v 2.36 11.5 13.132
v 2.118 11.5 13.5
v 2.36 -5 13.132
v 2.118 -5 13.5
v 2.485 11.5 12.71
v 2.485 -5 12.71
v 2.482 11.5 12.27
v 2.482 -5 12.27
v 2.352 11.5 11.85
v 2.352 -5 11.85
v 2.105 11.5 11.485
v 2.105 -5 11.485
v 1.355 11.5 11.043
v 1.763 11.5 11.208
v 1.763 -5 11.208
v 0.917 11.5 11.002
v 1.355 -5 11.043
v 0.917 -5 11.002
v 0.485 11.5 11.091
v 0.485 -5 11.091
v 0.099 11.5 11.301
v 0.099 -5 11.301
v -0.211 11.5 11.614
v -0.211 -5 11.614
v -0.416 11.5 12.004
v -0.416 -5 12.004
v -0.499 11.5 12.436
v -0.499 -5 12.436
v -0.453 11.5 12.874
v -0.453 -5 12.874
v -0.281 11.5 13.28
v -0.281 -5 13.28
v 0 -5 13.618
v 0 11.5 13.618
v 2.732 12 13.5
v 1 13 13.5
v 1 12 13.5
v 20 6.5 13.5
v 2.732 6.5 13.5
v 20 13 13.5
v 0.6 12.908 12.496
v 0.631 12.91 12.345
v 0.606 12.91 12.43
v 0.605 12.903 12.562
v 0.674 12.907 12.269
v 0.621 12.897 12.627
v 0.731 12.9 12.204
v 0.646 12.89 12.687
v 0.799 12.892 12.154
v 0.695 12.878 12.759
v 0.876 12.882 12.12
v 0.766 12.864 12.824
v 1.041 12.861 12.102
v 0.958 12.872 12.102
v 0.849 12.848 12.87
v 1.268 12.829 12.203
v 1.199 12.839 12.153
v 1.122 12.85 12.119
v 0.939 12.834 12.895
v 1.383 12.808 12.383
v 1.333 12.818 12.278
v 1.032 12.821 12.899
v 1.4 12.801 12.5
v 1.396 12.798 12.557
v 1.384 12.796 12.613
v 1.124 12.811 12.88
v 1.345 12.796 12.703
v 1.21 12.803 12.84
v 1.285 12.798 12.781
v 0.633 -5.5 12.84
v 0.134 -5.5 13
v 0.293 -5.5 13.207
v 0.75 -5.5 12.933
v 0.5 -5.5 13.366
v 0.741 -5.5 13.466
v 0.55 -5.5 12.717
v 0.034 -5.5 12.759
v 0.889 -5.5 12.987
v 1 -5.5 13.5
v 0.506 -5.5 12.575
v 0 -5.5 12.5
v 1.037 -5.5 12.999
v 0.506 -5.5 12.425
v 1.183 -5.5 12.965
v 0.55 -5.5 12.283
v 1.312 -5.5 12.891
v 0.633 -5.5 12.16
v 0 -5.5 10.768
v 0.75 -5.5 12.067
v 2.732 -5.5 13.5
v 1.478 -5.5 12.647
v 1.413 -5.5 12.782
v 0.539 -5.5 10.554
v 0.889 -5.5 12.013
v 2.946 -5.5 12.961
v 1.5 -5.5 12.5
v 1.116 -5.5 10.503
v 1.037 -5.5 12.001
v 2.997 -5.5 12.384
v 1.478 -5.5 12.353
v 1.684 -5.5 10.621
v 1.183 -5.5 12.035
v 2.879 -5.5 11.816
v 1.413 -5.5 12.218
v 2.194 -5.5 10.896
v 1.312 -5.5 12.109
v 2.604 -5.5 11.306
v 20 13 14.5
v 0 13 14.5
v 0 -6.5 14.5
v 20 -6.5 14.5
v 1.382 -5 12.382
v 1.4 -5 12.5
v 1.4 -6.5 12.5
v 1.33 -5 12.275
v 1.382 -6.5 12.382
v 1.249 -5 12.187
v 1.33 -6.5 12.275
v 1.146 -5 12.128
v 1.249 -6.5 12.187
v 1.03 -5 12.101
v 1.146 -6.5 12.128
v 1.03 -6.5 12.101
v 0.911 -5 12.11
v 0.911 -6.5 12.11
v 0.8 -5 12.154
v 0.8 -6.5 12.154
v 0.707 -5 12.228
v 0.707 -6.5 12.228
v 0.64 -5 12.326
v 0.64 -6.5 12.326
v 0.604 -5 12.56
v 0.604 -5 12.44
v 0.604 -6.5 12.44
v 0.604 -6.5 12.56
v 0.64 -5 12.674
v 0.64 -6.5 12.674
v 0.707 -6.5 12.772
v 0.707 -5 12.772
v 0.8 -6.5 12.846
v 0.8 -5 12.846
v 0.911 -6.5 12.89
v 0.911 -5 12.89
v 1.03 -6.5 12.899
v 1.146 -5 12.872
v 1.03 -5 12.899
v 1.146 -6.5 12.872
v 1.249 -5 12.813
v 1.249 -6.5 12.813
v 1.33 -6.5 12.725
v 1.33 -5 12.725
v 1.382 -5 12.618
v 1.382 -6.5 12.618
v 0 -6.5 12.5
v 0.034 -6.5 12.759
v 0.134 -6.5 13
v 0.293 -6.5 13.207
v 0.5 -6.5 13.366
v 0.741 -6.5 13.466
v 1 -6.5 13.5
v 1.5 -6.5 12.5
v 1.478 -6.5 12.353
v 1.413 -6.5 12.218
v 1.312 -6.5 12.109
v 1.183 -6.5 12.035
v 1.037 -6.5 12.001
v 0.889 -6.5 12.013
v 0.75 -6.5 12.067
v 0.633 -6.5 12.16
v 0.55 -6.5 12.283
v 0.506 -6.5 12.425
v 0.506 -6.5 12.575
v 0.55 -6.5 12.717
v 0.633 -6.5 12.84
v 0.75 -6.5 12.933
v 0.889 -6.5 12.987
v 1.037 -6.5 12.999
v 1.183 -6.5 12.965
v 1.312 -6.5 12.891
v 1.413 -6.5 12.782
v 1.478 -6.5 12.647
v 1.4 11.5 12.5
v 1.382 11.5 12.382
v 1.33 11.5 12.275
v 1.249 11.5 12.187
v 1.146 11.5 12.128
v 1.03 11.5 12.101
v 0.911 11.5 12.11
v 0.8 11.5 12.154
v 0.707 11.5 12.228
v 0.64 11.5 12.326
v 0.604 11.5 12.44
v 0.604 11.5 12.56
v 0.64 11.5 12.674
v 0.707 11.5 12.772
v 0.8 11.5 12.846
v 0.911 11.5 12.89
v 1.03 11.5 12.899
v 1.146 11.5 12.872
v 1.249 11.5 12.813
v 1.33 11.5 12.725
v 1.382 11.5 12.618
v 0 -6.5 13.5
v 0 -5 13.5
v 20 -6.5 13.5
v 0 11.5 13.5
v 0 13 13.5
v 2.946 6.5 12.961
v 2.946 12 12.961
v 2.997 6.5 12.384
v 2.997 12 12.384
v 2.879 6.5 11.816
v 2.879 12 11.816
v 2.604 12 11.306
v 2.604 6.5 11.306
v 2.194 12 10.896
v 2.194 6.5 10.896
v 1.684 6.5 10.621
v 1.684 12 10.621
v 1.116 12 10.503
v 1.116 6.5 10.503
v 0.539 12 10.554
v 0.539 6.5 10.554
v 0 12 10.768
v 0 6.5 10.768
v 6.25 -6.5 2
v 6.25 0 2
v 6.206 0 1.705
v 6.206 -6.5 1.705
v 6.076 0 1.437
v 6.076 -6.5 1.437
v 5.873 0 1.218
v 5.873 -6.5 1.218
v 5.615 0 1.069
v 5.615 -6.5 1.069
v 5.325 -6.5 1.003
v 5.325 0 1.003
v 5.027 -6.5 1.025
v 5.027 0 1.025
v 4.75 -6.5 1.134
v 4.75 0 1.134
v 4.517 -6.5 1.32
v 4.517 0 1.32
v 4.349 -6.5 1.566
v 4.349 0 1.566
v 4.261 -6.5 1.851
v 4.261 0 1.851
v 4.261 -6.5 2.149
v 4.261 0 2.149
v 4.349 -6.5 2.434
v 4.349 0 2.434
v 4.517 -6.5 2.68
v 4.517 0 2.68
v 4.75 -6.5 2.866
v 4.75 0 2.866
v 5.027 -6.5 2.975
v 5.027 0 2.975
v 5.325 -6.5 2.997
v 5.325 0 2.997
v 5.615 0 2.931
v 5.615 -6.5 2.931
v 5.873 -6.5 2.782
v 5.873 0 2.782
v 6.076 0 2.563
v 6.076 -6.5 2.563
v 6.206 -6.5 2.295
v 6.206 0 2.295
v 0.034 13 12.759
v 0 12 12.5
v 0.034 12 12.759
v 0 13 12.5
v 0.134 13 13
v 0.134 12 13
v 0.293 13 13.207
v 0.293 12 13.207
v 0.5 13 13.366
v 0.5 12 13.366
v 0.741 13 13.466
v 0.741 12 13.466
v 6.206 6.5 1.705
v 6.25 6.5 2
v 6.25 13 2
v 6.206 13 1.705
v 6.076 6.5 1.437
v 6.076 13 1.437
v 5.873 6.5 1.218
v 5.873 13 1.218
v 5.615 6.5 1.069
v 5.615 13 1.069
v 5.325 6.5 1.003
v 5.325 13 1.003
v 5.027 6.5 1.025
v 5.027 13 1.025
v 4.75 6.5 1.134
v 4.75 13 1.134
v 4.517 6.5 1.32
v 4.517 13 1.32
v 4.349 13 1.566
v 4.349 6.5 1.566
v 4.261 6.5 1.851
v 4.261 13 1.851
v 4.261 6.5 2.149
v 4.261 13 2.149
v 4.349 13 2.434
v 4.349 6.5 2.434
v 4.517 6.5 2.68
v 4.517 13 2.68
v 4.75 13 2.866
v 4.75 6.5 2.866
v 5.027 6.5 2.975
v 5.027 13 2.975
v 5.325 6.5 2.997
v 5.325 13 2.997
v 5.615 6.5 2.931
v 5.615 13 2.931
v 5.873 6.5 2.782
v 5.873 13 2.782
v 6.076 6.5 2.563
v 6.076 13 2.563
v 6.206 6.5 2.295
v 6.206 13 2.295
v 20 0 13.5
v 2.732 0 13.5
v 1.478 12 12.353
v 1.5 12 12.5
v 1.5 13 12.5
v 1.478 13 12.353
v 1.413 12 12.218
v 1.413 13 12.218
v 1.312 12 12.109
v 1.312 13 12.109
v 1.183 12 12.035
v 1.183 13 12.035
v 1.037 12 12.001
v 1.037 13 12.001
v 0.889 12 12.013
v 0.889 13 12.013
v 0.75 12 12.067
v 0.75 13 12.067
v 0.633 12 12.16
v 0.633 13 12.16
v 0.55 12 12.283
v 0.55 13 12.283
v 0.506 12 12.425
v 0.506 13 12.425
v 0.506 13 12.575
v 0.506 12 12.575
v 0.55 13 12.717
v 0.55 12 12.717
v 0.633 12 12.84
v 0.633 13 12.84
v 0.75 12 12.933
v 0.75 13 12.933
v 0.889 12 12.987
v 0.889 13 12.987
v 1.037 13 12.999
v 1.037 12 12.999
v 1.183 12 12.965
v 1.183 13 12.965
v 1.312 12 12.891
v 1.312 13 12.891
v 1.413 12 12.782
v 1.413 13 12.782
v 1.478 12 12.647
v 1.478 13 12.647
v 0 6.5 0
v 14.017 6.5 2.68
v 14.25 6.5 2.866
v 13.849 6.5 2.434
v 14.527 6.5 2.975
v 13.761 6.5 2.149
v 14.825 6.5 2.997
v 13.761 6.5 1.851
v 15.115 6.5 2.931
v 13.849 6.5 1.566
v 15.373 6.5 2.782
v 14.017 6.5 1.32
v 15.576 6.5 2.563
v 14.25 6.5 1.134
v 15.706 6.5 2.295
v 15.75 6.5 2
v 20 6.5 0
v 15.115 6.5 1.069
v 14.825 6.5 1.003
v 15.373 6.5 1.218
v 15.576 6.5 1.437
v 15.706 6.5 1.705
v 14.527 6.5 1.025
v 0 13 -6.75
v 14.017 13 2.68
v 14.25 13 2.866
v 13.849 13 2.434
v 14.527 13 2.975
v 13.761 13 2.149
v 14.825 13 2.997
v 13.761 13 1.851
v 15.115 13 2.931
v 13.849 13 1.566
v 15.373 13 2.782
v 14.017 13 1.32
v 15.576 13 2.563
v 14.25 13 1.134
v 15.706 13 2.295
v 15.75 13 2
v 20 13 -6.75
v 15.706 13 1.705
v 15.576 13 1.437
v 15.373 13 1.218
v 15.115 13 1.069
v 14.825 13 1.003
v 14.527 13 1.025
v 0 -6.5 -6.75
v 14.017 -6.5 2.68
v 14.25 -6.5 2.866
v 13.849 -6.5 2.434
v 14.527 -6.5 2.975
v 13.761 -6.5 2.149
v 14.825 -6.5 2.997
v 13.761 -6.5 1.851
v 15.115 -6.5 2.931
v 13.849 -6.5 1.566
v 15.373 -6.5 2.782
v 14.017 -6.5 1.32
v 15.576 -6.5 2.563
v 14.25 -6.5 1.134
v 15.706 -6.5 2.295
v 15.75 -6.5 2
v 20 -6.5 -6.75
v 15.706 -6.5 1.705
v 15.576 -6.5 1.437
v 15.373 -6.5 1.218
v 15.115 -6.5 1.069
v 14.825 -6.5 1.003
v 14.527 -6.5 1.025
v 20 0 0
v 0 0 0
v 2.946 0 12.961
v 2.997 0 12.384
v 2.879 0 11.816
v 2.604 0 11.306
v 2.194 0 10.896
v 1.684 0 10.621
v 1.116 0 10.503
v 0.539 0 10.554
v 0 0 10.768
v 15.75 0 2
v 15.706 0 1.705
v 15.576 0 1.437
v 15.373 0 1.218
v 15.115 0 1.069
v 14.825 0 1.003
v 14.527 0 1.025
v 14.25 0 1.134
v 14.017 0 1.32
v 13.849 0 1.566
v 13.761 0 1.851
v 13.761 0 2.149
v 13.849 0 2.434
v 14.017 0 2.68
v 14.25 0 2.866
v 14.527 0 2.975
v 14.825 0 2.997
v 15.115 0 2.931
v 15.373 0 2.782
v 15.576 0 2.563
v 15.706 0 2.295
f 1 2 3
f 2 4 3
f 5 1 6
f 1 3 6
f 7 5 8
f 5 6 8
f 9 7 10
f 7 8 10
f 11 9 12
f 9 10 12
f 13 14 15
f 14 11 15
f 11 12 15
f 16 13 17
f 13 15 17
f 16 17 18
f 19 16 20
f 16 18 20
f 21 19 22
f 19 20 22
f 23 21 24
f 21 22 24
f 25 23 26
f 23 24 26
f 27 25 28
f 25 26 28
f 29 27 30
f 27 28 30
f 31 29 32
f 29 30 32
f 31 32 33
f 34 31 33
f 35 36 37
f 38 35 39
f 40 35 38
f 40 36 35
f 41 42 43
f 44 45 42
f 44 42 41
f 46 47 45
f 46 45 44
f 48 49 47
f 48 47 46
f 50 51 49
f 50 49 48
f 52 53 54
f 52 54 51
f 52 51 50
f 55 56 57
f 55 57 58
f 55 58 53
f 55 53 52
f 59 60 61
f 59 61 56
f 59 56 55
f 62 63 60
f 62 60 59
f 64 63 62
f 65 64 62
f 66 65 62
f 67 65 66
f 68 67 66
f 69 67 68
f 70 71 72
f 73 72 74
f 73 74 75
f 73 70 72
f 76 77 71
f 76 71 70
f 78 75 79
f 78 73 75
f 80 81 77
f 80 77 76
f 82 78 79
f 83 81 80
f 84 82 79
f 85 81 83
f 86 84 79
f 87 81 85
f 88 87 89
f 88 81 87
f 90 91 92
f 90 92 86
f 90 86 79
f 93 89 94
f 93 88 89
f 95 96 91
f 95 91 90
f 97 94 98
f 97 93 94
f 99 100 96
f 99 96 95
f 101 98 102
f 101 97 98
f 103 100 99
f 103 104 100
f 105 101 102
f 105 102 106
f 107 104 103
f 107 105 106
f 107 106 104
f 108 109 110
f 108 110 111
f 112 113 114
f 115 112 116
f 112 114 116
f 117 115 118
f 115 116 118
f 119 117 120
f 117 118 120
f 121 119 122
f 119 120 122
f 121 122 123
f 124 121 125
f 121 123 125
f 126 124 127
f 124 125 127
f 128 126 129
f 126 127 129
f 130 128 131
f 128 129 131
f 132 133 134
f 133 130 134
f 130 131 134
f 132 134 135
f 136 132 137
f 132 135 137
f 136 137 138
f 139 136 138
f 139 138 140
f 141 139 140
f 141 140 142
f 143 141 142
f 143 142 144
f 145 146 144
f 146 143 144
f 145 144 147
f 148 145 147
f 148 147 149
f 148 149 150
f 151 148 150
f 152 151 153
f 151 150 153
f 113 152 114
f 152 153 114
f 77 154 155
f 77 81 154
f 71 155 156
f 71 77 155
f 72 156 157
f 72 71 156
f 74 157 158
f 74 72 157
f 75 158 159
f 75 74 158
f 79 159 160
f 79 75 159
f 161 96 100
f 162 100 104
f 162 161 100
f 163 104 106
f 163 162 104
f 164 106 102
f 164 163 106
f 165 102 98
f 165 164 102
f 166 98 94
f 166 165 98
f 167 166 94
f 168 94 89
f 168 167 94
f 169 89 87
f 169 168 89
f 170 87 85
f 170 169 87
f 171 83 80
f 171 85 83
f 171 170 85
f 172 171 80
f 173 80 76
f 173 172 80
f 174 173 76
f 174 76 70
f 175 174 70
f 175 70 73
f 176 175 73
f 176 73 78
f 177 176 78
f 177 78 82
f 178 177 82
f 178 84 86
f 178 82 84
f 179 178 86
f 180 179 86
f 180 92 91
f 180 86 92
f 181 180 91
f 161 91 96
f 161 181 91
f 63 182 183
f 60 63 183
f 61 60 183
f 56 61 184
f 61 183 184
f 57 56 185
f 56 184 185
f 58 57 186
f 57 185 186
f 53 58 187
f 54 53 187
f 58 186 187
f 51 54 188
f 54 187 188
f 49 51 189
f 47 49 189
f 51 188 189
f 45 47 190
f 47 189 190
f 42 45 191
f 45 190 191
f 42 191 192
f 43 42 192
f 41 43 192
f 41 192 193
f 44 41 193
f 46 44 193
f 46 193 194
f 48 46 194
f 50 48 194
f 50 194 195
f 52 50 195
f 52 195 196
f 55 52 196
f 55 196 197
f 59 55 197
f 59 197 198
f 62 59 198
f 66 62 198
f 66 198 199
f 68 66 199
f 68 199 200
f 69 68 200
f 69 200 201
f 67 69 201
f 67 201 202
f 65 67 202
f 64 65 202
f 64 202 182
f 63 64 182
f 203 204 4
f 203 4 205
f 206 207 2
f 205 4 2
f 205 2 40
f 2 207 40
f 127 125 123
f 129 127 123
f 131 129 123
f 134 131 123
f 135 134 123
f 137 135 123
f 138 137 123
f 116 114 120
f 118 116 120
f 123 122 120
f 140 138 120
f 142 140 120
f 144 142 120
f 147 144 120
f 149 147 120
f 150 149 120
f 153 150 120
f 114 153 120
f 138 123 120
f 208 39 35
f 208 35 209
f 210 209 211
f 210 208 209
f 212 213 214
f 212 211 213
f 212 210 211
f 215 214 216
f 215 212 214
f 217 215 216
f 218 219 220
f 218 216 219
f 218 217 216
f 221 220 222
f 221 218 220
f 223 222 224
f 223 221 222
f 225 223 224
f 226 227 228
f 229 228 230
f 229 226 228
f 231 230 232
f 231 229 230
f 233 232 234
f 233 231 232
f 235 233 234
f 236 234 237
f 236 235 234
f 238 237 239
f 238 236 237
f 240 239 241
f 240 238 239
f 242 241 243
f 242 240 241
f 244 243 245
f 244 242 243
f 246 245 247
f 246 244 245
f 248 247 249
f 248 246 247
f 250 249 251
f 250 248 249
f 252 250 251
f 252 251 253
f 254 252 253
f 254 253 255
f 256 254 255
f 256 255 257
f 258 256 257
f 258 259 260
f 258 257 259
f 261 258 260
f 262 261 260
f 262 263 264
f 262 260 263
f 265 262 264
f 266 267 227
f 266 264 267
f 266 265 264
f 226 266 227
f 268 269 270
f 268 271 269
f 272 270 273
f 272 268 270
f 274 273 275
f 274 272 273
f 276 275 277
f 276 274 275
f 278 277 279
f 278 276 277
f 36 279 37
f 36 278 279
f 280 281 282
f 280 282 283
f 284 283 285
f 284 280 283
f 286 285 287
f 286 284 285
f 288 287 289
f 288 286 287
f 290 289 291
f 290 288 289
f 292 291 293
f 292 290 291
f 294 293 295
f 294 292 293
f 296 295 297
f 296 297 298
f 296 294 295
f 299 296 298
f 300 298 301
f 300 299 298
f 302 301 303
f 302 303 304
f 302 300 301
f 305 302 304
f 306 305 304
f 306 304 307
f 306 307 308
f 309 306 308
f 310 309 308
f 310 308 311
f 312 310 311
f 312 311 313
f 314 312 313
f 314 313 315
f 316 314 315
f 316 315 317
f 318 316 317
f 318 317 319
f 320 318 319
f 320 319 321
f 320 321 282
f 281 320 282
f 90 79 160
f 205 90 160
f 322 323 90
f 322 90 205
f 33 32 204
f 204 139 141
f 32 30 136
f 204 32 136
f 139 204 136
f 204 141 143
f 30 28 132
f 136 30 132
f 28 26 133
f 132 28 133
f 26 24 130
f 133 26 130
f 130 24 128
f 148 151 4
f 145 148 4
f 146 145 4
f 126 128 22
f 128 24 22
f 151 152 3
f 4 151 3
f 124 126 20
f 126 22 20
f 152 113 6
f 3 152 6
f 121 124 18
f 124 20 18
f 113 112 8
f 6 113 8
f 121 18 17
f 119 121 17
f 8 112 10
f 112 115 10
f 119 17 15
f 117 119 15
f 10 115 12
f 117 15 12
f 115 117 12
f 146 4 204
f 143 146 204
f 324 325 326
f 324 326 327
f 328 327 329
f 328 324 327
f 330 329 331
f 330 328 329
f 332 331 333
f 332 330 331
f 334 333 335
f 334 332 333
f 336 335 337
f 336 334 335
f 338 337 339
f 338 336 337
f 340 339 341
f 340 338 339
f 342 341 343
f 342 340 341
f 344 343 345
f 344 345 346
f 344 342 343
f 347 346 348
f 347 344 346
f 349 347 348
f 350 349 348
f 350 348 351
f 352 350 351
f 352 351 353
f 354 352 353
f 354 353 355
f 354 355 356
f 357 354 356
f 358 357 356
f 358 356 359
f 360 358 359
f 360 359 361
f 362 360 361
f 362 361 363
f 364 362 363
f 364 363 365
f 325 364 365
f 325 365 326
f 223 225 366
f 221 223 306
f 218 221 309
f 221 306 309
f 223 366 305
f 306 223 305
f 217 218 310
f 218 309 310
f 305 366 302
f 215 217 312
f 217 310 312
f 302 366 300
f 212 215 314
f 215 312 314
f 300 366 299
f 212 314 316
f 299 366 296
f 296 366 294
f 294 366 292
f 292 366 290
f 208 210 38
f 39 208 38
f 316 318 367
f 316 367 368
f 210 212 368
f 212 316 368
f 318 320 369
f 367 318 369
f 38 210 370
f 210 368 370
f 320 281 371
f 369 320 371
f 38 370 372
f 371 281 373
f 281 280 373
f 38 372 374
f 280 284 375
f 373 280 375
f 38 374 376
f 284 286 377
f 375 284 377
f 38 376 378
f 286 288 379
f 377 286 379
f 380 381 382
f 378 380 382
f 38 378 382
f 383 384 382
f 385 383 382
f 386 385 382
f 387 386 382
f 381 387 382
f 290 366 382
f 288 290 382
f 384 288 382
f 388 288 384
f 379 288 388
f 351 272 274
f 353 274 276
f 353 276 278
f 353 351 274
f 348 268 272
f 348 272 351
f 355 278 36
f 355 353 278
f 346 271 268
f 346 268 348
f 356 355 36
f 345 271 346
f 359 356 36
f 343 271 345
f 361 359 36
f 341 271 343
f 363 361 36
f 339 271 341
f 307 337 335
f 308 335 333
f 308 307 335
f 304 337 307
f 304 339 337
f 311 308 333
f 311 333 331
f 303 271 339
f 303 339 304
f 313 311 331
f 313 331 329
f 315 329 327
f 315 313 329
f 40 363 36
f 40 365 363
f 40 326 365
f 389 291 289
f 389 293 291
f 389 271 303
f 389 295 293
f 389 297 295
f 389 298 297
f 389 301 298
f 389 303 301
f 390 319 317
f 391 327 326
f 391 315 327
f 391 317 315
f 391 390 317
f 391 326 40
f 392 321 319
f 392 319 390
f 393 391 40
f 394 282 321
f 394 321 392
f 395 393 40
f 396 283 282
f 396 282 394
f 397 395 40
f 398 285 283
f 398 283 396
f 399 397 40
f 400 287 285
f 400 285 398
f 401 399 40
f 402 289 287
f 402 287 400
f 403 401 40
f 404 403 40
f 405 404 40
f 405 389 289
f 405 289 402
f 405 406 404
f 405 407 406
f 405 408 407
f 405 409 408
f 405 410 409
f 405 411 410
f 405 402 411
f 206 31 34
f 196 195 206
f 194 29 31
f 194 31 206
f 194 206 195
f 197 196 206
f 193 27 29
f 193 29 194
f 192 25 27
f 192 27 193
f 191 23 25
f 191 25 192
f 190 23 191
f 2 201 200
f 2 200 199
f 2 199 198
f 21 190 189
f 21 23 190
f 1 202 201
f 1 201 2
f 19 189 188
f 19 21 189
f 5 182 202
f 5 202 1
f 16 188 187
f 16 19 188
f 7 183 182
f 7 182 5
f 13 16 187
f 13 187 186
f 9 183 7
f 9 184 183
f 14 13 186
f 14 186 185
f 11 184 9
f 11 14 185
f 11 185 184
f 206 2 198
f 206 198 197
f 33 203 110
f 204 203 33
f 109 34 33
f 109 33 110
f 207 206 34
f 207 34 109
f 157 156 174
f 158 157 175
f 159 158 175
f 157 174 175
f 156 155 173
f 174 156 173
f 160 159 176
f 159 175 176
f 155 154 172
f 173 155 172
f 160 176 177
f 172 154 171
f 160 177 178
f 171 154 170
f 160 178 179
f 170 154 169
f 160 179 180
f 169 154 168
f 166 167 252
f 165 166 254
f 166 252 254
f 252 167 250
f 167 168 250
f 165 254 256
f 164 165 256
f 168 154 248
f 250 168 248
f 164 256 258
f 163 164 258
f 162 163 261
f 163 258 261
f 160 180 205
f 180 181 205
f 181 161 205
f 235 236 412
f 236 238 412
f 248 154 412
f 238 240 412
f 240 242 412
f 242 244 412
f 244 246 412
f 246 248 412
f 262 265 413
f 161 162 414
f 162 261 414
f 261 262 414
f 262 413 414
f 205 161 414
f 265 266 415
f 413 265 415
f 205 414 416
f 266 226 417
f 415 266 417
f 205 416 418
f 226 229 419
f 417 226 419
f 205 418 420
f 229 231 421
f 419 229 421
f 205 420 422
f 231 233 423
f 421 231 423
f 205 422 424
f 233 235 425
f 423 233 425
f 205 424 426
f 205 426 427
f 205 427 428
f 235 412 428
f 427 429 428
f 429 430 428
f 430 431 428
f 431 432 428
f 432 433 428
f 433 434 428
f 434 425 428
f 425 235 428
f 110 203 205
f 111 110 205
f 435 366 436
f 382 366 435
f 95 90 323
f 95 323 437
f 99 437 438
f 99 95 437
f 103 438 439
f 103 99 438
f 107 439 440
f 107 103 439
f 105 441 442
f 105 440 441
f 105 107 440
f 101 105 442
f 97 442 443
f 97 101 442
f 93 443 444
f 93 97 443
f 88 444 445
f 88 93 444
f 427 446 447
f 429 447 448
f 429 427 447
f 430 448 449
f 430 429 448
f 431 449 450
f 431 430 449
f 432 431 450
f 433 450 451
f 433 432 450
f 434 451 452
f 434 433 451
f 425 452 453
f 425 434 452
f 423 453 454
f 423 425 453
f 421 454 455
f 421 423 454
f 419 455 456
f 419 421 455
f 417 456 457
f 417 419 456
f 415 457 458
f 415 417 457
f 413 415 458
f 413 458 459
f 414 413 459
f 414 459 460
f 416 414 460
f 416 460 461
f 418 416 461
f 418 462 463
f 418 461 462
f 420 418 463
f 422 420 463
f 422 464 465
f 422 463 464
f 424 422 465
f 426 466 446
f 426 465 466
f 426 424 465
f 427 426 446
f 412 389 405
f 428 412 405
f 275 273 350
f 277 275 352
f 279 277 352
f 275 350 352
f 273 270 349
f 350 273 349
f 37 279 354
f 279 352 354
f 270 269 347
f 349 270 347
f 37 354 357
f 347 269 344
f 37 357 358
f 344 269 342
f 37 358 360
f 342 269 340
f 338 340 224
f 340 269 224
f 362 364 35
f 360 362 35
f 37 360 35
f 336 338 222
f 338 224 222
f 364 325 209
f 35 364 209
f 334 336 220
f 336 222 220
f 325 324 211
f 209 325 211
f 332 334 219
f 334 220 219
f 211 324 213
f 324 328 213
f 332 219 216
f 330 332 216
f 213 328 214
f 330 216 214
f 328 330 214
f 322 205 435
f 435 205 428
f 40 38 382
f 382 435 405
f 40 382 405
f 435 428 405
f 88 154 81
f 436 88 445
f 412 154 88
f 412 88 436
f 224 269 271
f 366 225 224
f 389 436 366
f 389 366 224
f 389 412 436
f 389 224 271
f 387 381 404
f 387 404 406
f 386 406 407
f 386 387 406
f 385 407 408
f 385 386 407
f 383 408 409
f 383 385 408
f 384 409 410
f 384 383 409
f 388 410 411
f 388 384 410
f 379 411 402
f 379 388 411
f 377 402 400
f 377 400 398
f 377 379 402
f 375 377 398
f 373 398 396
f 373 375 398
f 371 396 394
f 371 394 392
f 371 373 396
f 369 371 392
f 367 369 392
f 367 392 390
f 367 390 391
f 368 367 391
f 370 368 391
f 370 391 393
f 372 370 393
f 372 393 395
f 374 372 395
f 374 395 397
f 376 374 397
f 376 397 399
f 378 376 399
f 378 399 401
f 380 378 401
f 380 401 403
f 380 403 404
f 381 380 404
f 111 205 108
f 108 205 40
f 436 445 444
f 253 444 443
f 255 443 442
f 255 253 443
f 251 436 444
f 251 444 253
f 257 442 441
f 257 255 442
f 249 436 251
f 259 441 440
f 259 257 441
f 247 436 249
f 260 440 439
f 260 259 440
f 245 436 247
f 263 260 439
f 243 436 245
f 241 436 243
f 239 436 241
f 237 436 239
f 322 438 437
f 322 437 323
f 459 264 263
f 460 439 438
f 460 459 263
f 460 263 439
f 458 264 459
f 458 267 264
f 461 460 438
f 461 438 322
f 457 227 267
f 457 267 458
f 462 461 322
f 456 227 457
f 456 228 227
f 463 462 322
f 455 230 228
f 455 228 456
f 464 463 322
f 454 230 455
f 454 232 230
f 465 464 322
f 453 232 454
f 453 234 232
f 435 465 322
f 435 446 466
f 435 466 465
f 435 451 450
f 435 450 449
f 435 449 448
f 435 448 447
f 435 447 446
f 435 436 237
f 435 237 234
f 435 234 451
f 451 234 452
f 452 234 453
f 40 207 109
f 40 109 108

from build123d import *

# Parameters (mm, degrees)
CONE_PITCH_ANGLE       = 90
CYLINDER003_R          = 0.4
CYLINDER003_DEPTH      = 19.5
CYLINDER003_ROLL_ANGLE = -90
CYLINDER002_R          = 1.5
CYLINDER002_DEPTH      = 16.5
CYLINDER002_ROLL_ANGLE = -90
BOX002_W               = 20
BOX002_H               = 19.5
BOX002_DEPTH           = 1
CYLINDER001_R          = 0.5
CYLINDER001_DEPTH      = 19.5
CYLINDER001_ROLL_ANGLE = -90
CYLINDER005_R          = 1
CYLINDER005_DEPTH      = 19.5
CYLINDER005_ROLL_ANGLE = -90
CYLINDER004_R          = 1
CYLINDER004_DEPTH      = 19.5
CYLINDER004_ROLL_ANGLE = -90
BOX001_W               = 20
BOX001_H               = 6.5
BOX001_DEPTH           = 13.5
CYLINDER_R             = 2
CYLINDER_DEPTH         = 17.5
CYLINDER_ROLL_ANGLE    = -90
BOX_W                  = 20
BOX_H                  = 19.5
BOX_DEPTH              = 20.25
FILLET_R               = 1


with BuildPart() as cone:
    # Cone → Cone (revolve)
    with BuildSketch(Plane.XZ):
        Polygon((0, 0), (10, 0), (6, 30), (0, 30), align=None)
    revolve(axis=Axis((0, 0, 0), (0, 0, 1)))


with BuildPart() as cone_1:
    # Cone pitch: moved
    add(cone.part.rotate(Axis((0, 0, 0), (0, 1, 0)), CONE_PITCH_ANGLE))


with BuildPart() as cone_2:
    # Cone placement: moved
    add(cone_1.part.moved(Location((0, 3, 12))))


with BuildPart() as lid_hinge_pin_tapered:
    # Cylinder003 → Cylinder003 (new body)
    with BuildSketch(Plane.XY):
        Circle(CYLINDER003_R)
    extrude(amount=CYLINDER003_DEPTH)


with BuildPart() as lid_hinge_pin_tapered_1:
    # Cylinder003 roll: moved
    add(lid_hinge_pin_tapered.part.rotate(Axis((0, 0, 0), (1, 0, 0)), CYLINDER003_ROLL_ANGLE))


with BuildPart() as lid_hinge_pin_tapered_2:
    # Cylinder003 placement: moved
    add(lid_hinge_pin_tapered_1.part.moved(Location((1, -6.5, 12.5))))

    # Common: intersect Cone
    add(cone_2.part, mode=Mode.INTERSECT)


with BuildPart() as lid_hinge:
    # Cylinder002 → Cylinder002 (new body)
    with BuildSketch(Plane.XY):
        Circle(CYLINDER002_R)
    extrude(amount=CYLINDER002_DEPTH)


with BuildPart() as lid_hinge_1:
    # Cylinder002 roll: moved
    add(lid_hinge.part.rotate(Axis((0, 0, 0), (1, 0, 0)), CYLINDER002_ROLL_ANGLE))


with BuildPart() as lid_hinge_2:
    # Cylinder002 placement: moved
    add(lid_hinge_1.part.moved(Location((1, -5, 12.5))))

    # Fusion003: union lid_hinge_pin_tapered
    add(lid_hinge_pin_tapered_2.part)


with BuildPart() as lid:
    # Box002 → Box002 (new body)
    with BuildSketch(Plane(origin=(0, -6.5, 13.5), x_dir=(1, 0, 0), z_dir=(0, 0, 1))):
        with Locations((10, 9.75)):
            Rectangle(BOX002_W, BOX002_H)
    extrude(amount=BOX002_DEPTH)

    # Fusion: union lid_hinge
    add(lid_hinge_2.part)


with BuildPart() as hinge_pin_hole:
    # Cylinder001 → Cylinder001 (new body)
    with BuildSketch(Plane.XY):
        Circle(CYLINDER001_R)
    extrude(amount=CYLINDER001_DEPTH)


with BuildPart() as hinge_pin_hole_1:
    # Cylinder001 roll: moved
    add(hinge_pin_hole.part.rotate(Axis((0, 0, 0), (1, 0, 0)), CYLINDER001_ROLL_ANGLE))


with BuildPart() as hinge_pin_hole_2:
    # Cylinder001 placement: moved
    add(hinge_pin_hole_1.part.moved(Location((1, -6.5, 12.5))))


with BuildPart() as cylinder005:
    # Cylinder005 → Cylinder005 (new body)
    with BuildSketch(Plane.XY):
        Circle(CYLINDER005_R)
    extrude(amount=CYLINDER005_DEPTH)


with BuildPart() as cylinder005_1:
    # Cylinder005 roll: moved
    add(cylinder005.part.rotate(Axis((0, 0, 0), (1, 0, 0)), CYLINDER005_ROLL_ANGLE))


with BuildPart() as cylinder005_2:
    # Cylinder005 placement: moved
    add(cylinder005_1.part.moved(Location((14.75, -6.5, 2))))


with BuildPart() as cylinder004:
    # Cylinder004 → Cylinder004 (new body)
    with BuildSketch(Plane.XY):
        Circle(CYLINDER004_R)
    extrude(amount=CYLINDER004_DEPTH)


with BuildPart() as cylinder004_1:
    # Cylinder004 roll: moved
    add(cylinder004.part.rotate(Axis((0, 0, 0), (1, 0, 0)), CYLINDER004_ROLL_ANGLE))


with BuildPart() as cylinder004_2:
    # Cylinder004 placement: moved
    add(cylinder004_1.part.moved(Location((5.25, -6.5, 2))))


with BuildPart() as switch_with_mounting_hole_cutouts:
    # Box001 → Box001 (new body)
    with BuildSketch(Plane.XY):
        with Locations((10, 3.25)):
            Rectangle(BOX001_W, BOX001_H)
    extrude(amount=BOX001_DEPTH)

    # Fusion001: union Cylinder004
    add(cylinder004_2.part)

    # Fusion002: union Cylinder005
    add(cylinder005_2.part)


with BuildPart() as main_block_hinge_notch:
    # Cylinder → Cylinder (new body)
    with BuildSketch(Plane.XY):
        Circle(CYLINDER_R)
    extrude(amount=CYLINDER_DEPTH)


with BuildPart() as main_block_hinge_notch_1:
    # Cylinder roll: moved
    add(main_block_hinge_notch.part.rotate(Axis((0, 0, 0), (1, 0, 0)), CYLINDER_ROLL_ANGLE))


with BuildPart() as main_block_hinge_notch_2:
    # Cylinder placement: moved
    add(main_block_hinge_notch_1.part.moved(Location((1, -5.5, 12.5))))


with BuildPart() as fillet_body:
    # Box → Box (new body)
    with BuildSketch(Plane(origin=(0, -6.5, -6.75), x_dir=(1, 0, 0), z_dir=(0, 0, 1))):
        with Locations((10, 9.75)):
            Rectangle(BOX_W, BOX_H)
    extrude(amount=BOX_DEPTH)

    # Cut: cut main_block_hinge_notch
    add(main_block_hinge_notch_2.part, mode=Mode.SUBTRACT)

    # Cut001: cut Switch_with_mounting_hole_cutouts
    add(switch_with_mounting_hole_cutouts.part, mode=Mode.SUBTRACT)

    # Cut002: cut Hinge_pin_hole
    add(hinge_pin_hole_2.part, mode=Mode.SUBTRACT)

    # Fillet
    fillet_edges = [fillet_body.edges().sort_by_distance(p)[0] for p in [
        (0, -6, 13.5),
        (0, 12.5, 13.5),
    ]]
    fillet(fillet_edges, radius=FILLET_R)


solid = Compound([lid.part, fillet_body.part])
